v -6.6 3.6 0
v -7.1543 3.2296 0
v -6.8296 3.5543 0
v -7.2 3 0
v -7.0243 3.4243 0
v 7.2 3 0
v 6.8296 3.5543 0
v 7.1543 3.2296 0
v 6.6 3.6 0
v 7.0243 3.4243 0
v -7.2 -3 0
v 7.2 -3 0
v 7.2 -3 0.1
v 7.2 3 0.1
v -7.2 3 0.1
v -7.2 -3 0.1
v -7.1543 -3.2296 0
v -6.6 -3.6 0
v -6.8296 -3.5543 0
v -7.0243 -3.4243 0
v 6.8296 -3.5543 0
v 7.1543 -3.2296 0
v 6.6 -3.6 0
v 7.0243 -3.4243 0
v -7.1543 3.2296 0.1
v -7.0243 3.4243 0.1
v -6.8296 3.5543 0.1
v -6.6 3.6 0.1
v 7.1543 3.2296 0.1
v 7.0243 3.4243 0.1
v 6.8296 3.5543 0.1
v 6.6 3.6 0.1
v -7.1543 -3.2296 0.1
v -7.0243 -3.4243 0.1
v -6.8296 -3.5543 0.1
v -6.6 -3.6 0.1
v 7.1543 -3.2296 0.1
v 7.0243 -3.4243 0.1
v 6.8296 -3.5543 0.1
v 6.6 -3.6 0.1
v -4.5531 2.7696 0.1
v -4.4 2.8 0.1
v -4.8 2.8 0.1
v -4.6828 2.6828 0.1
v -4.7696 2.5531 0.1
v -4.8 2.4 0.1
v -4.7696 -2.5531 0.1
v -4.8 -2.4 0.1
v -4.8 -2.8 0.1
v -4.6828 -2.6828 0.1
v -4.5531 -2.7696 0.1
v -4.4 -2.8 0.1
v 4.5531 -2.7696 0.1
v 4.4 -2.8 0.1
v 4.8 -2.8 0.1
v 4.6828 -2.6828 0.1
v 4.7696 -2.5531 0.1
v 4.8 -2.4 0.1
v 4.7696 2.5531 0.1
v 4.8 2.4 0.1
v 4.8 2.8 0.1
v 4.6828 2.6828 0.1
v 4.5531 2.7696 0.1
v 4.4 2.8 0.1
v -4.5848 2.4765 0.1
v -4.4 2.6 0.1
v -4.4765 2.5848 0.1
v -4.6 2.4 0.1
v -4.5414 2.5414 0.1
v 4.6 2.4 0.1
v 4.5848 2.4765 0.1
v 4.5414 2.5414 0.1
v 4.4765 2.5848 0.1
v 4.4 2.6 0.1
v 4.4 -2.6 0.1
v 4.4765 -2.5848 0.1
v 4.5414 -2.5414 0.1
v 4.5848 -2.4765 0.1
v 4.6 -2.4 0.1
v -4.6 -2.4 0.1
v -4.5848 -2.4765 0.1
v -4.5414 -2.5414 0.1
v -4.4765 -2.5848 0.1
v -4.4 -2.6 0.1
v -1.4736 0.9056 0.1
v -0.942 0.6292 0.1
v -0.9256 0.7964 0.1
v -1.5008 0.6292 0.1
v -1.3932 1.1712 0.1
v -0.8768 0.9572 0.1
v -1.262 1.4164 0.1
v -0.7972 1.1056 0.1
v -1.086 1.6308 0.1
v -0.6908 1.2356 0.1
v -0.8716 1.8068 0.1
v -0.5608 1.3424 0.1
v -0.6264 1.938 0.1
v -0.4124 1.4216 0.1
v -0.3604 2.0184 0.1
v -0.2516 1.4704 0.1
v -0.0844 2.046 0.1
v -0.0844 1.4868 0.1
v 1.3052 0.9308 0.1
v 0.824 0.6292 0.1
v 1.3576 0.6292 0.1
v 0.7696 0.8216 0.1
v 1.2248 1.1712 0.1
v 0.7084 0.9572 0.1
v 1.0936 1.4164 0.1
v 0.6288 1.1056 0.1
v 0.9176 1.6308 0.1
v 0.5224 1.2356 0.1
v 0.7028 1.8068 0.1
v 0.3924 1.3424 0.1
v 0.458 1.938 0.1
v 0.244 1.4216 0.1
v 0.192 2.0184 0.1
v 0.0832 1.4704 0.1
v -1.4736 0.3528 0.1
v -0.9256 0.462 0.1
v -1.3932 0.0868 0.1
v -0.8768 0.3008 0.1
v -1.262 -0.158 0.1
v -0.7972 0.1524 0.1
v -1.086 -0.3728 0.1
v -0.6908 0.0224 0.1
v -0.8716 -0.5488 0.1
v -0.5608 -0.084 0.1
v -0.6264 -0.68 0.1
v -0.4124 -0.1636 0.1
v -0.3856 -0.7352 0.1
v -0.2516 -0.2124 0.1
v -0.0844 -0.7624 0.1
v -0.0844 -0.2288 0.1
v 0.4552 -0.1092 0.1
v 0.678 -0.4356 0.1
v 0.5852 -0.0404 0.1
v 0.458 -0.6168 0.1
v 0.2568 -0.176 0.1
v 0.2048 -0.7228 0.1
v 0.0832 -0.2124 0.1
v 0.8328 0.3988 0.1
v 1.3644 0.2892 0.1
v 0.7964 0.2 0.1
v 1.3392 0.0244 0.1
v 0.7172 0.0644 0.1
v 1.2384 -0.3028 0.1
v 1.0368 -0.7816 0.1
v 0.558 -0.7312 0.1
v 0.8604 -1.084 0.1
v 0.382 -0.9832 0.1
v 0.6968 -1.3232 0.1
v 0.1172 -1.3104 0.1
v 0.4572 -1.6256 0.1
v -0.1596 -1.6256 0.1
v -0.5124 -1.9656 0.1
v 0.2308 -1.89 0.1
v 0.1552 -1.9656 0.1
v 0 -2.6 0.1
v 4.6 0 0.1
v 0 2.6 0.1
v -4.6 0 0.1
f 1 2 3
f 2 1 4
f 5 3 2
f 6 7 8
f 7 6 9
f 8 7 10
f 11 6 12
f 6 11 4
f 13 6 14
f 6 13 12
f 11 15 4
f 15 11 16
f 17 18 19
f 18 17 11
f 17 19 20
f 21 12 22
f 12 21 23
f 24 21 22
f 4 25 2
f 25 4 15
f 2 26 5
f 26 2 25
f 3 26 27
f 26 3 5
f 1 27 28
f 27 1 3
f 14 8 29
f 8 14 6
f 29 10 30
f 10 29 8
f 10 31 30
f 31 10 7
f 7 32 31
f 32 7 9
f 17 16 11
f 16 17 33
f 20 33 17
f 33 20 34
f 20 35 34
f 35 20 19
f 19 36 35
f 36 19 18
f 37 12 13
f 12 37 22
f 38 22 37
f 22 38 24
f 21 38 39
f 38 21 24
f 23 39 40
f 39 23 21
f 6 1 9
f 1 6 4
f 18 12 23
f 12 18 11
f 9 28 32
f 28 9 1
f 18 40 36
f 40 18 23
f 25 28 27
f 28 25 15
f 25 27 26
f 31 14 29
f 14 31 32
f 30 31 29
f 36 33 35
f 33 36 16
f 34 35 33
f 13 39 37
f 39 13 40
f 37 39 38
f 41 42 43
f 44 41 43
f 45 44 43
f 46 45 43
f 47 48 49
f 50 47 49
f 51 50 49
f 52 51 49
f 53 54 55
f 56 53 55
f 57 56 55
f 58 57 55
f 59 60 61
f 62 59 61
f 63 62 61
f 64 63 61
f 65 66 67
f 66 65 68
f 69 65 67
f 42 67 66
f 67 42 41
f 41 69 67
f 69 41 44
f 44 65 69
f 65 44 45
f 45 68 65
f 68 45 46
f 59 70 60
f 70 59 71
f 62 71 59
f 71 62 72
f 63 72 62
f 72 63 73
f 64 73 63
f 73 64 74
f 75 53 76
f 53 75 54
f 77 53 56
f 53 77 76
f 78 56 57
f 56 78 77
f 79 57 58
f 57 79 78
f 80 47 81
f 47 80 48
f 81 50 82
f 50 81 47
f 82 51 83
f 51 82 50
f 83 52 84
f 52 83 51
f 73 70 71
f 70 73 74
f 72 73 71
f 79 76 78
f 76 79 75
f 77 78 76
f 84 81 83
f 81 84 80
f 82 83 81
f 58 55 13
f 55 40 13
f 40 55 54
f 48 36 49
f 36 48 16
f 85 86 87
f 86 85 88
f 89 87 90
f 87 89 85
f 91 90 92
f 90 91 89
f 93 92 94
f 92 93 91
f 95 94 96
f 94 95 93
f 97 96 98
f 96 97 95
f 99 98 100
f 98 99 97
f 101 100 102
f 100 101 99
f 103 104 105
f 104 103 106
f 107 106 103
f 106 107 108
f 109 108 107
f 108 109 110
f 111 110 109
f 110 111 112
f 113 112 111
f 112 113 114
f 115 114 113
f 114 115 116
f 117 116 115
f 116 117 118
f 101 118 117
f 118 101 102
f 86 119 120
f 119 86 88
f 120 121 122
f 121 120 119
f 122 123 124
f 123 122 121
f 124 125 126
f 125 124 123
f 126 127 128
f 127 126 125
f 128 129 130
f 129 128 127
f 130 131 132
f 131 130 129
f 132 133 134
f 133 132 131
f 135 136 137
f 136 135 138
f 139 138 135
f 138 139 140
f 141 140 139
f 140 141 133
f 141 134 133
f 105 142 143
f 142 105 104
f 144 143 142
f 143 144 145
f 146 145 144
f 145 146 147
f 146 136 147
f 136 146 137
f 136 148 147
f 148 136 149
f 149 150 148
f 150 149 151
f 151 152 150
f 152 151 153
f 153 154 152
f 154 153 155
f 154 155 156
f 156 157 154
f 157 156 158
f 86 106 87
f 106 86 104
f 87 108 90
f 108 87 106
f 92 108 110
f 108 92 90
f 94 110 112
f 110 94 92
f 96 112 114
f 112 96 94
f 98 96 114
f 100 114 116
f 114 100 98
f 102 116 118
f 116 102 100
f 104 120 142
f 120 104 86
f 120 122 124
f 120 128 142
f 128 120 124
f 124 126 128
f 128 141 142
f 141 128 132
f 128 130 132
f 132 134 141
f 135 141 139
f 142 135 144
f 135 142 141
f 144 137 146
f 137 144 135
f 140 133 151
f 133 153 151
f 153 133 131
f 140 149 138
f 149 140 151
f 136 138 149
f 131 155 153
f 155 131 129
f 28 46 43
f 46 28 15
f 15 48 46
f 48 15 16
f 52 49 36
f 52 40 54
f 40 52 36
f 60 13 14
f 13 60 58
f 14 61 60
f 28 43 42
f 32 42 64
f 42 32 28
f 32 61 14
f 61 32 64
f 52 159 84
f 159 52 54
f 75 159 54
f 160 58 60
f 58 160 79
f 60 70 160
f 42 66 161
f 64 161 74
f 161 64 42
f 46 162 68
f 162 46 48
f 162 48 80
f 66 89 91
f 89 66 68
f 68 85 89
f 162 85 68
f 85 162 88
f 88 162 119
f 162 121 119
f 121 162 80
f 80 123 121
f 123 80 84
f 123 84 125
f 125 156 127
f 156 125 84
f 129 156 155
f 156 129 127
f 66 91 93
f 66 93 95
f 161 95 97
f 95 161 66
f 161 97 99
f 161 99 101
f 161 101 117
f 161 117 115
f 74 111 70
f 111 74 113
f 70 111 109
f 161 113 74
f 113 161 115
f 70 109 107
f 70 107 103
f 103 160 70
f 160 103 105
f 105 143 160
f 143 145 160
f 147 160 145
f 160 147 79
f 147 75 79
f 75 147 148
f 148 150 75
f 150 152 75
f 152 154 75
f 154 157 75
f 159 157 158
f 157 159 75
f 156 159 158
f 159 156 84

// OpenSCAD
// file: ../p/box3u12.scad
use <../lib.scad>
function ldraw_lib__box3u12() = [
// 0 Box with 3 Parallel Faces without Any Edges
// 0 Name: box3u12.dat
// 0 Author: J.C. Tchang [tchang]
// 0 !LDRAW_ORG Primitive UPDATE 2014-02
// 0 !LICENSE Licensed under CC BY 4.0 : see CAreadme.txt
// 
// 0 BFC CERTIFY CCW
  [0,"BFC","CERTIFY"],
  [0,"BFC","CCW"],
// 
// 0 !HISTORY 2014-12-23 [PTadmin] Official Update 2014-02
// 
// 
// 4 16 -1 1 1 1 1 1 1 1 -1 -1 1 -1
  [4,16,-1,1,1,1,1,1,1,1,-1,-1,1,-1],
// 4 16 -1 1 1 -1 0 1 1 0 1 1 1 1
  [4,16,-1,1,1,-1,0,1,1,0,1,1,1,1],
// 4 16 1 1 -1 1 0 -1 -1 0 -1 -1 1 -1
  [4,16,1,1,-1,1,0,-1,-1,0,-1,-1,1,-1],
];
module ldraw_lib__box3u12(step=0, col=false, unit=2/5, alt=false, line=0.2, solid=!$preview)
    makepoly(ldraw_lib__box3u12(), step=step, col=col, unit=unit, alt=alt, line=line, solid=solid);
ldraw_lib__box3u12(line=0.2);
// file: ../p/1-4cyli.scad
use <../lib.scad>
function ldraw_lib__1_4cyli() = [
// 0 Cylinder 0.25
// 0 Name: 1-4cyli.dat
// 0 Author: James Jessiman
// 0 !LDRAW_ORG Primitive UPDATE 2012-01
// 0 !LICENSE Licensed under CC BY 4.0 : see CAreadme.txt
// 
// 0 BFC CERTIFY CCW
  [0,"BFC","CERTIFY"],
  [0,"BFC","CCW"],
// 
// 0 !HISTORY 2002-03-23 [sbliss] Added BFC statement.
// 0 !HISTORY 2002-04-25 [PTadmin] Official Update 2002-02
// 0 !HISTORY 2007-06-22 [PTadmin] Header formatted for Contributor Agreement
// 0 !HISTORY 2008-07-01 [PTadmin] Official Update 2008-01
// 0 !HISTORY 2012-02-16 [Philo] Changed to CCW
// 0 !HISTORY 2012-03-30 [PTadmin] Official Update 2012-01
// 
// 
// 4 16 1 1 0 0.9239 1 0.3827 0.9239 0 0.3827 1 0 0
  [4,16,1,1,0,0.9239,1,0.3827,0.9239,0,0.3827,1,0,0],
// 5 24 1 0 0 1 1 0 0.9239 0 0.3827 1 0 -1
  [5,24,1,0,0,1,1,0,0.9239,0,0.3827,1,0,-1],
// 4 16 0.9239 1 0.3827 0.7071 1 0.7071 0.7071 0 0.7071 0.9239 0 0.3827
  [4,16,0.9239,1,0.3827,0.7071,1,0.7071,0.7071,0,0.7071,0.9239,0,0.3827],
// 5 24 0.9239 0 0.3827 0.9239 1 0.3827 0.7071 0 0.7071 1 0 0
  [5,24,0.9239,0,0.3827,0.9239,1,0.3827,0.7071,0,0.7071,1,0,0],
// 4 16 0.7071 1 0.7071 0.3827 1 0.9239 0.3827 0 0.9239 0.7071 0 0.7071
  [4,16,0.7071,1,0.7071,0.3827,1,0.9239,0.3827,0,0.9239,0.7071,0,0.7071],
// 5 24 0.7071 0 0.7071 0.7071 1 0.7071 0.3827 0 0.9239 0.9239 0 0.3827
  [5,24,0.7071,0,0.7071,0.7071,1,0.7071,0.3827,0,0.9239,0.9239,0,0.3827],
// 4 16 0.3827 1 0.9239 0 1 1 0 0 1 0.3827 0 0.9239
  [4,16,0.3827,1,0.9239,0,1,1,0,0,1,0.3827,0,0.9239],
// 5 24 0.3827 0 0.9239 0.3827 1 0.9239 0 0 1 0.7071 0 0.7071
  [5,24,0.3827,0,0.9239,0.3827,1,0.9239,0,0,1,0.7071,0,0.7071],
// 5 24 0 0 1 0 1 1 0.3827 0 0.9239 -1 0 1
  [5,24,0,0,1,0,1,1,0.3827,0,0.9239,-1,0,1],
];
module ldraw_lib__1_4cyli(step=0, col=false, unit=2/5, alt=false, line=0.2, solid=!$preview)
    makepoly(ldraw_lib__1_4cyli(), step=step, col=col, unit=unit, alt=alt, line=line, solid=solid);
ldraw_lib__1_4cyli(line=0.2);
// file: s/stickerback009x018.scad
use <../../lib.scad>
use <../../p/1-4chrd.scad>
use <../../p/1-4cyli.scad>
use <../../p/box3u12.scad>
function ldraw_lib__s__stickerback009x018() = [
// 0 ~Sticker Back  0.9 x  1.8
// 0 Name: s\stickerback009x018.dat
// 0 Author: Massimo Maso [Sirio]
// 0 !LDRAW_ORG Subpart UPDATE 2026-05
// 0 !LICENSE Licensed under CC BY 4.0 : see CAreadme.txt
// 
// 0 BFC CERTIFY CCW
  [0,"BFC","CERTIFY"],
  [0,"BFC","CCW"],
// 
// 0 !HISTORY 2026-05-31 [OrionP] Official Update 2026-05
// 
// 0 // Primitives
// 1 16 -16.5 0 7.5 -1.5 0 0 0 -1 0 0 0 1.5 1-4chrd.dat
  [1,16,-16.5,0,7.5,-1.5,0,0,0,-1,0,0,0,1.5, ldraw_lib__1_4chrd()],
// 1 16 16.5 0 7.5 1.5 0 0 0 -1 0 0 0 1.5 1-4chrd.dat
  [1,16,16.5,0,7.5,1.5,0,0,0,-1,0,0,0,1.5, ldraw_lib__1_4chrd()],
// 1 16 0 -.25 0 0 0 18 0 .25 0 7.5 0 0 box3u12.dat
  [1,16,0,-.25,0,0,0,18,0,.25,0,7.5,0,0, ldraw_lib__box3u12()],
// 1 16 -16.5 0 -7.5 -1.5 0 0 0 -1 0 0 0 -1.5 1-4chrd.dat
  [1,16,-16.5,0,-7.5,-1.5,0,0,0,-1,0,0,0,-1.5, ldraw_lib__1_4chrd()],
// 1 16 16.5 0 -7.5 1.5 0 0 0 -1 0 0 0 -1.5 1-4chrd.dat
  [1,16,16.5,0,-7.5,1.5,0,0,0,-1,0,0,0,-1.5, ldraw_lib__1_4chrd()],
// 1 16 -16.5 -.25 7.5 -1.5 0 0 0 .25 0 0 0 1.5 1-4cyli.dat
  [1,16,-16.5,-.25,7.5,-1.5,0,0,0,.25,0,0,0,1.5, ldraw_lib__1_4cyli()],
// 1 16 16.5 -.25 7.5 1.5 0 0 0 .25 0 0 0 1.5 1-4cyli.dat
  [1,16,16.5,-.25,7.5,1.5,0,0,0,.25,0,0,0,1.5, ldraw_lib__1_4cyli()],
// 1 16 -16.5 -.25 -7.5 -1.5 0 0 0 .25 0 0 0 -1.5 1-4cyli.dat
  [1,16,-16.5,-.25,-7.5,-1.5,0,0,0,.25,0,0,0,-1.5, ldraw_lib__1_4cyli()],
// 1 16 16.5 -.25 -7.5 1.5 0 0 0 .25 0 0 0 -1.5 1-4cyli.dat
  [1,16,16.5,-.25,-7.5,1.5,0,0,0,.25,0,0,0,-1.5, ldraw_lib__1_4cyli()],
// 0 // Bottom face
// 4 16 -18 0 7.5 -16.5 0 9 16.5 0 9 18 0 7.5
  [4,16,-18,0,7.5,-16.5,0,9,16.5,0,9,18,0,7.5],
// 4 16 -18 0 -7.5 18 0 -7.5 16.5 0 -9 -16.5 0 -9
  [4,16,-18,0,-7.5,18,0,-7.5,16.5,0,-9,-16.5,0,-9],
// 0 // Lateral face
// 4 16 -16.5 0 9 -16.5 -.25 9 16.5 -.25 9 16.5 0 9
  [4,16,-16.5,0,9,-16.5,-.25,9,16.5,-.25,9,16.5,0,9],
// 4 16 16.5 0 -9 16.5 -.25 -9 -16.5 -.25 -9 -16.5 0 -9
  [4,16,16.5,0,-9,16.5,-.25,-9,-16.5,-.25,-9,-16.5,0,-9],
];
module ldraw_lib__s__stickerback009x018(step=0, col=false, unit=2/5, alt=false, line=0.2, solid=!$preview)
    makepoly(ldraw_lib__s__stickerback009x018(), step=step, col=col, unit=unit, alt=alt, line=line, solid=solid);
ldraw_lib__s__stickerback009x018(line=0.2);
// file: ../p/1-4ring1.scad
use <../lib.scad>
function ldraw_lib__1_4ring1() = [
// 0 Ring  1 x 0.25
// 0 Name: 1-4ring1.dat
// 0 Author: Chris Dee [cwdee]
// 0 !LDRAW_ORG Primitive UPDATE 2012-01
// 0 !LICENSE Licensed under CC BY 4.0 : see CAreadme.txt
// 
// 0 BFC CERTIFY CCW
  [0,"BFC","CERTIFY"],
  [0,"BFC","CCW"],
// 
// 0 !HISTORY 2000-05-07 [PTadmin] Official Update 2000-01
// 0 !HISTORY 2002-11-22 [hafhead] Added BFC statement
// 0 !HISTORY 2002-11-30 [PTadmin] Official Update 2002-05
// 0 !HISTORY 2007-06-22 [PTadmin] Header formatted for Contributor Agreement
// 0 !HISTORY 2008-07-01 [PTadmin] Official Update 2008-01
// 0 !HISTORY 2012-02-16 [Philo] Changed to CCW
// 0 !HISTORY 2012-03-30 [PTadmin] Official Update 2012-01
// 
// 
// 4 16 2 0 0 1.8478 0 0.7654 0.9239 0 0.3827 1 0 0
  [4,16,2,0,0,1.8478,0,0.7654,0.9239,0,0.3827,1,0,0],
// 4 16 1.8478 0 0.7654 1.4142 0 1.4142 0.7071 0 0.7071 0.9239 0 0.3827
  [4,16,1.8478,0,0.7654,1.4142,0,1.4142,0.7071,0,0.7071,0.9239,0,0.3827],
// 4 16 1.4142 0 1.4142 0.7654 0 1.8478 0.3827 0 0.9239 0.7071 0 0.7071
  [4,16,1.4142,0,1.4142,0.7654,0,1.8478,0.3827,0,0.9239,0.7071,0,0.7071],
// 4 16 0.7654 0 1.8478 0 0 2 0 0 1 0.3827 0 0.9239
  [4,16,0.7654,0,1.8478,0,0,2,0,0,1,0.3827,0,0.9239],
];
module ldraw_lib__1_4ring1(step=0, col=false, unit=2/5, alt=false, line=0.2, solid=!$preview)
    makepoly(ldraw_lib__1_4ring1(), step=step, col=col, unit=unit, alt=alt, line=line, solid=solid);
ldraw_lib__1_4ring1(line=0.2);
// file: ../p/1-4ndis.scad
use <../lib.scad>
function ldraw_lib__1_4ndis() = [
// 0 Disc Negative 0.25
// 0 Name: 1-4ndis.dat
// 0 Author: James Jessiman
// 0 !LDRAW_ORG Primitive UPDATE 2012-01
// 0 !LICENSE Licensed under CC BY 4.0 : see CAreadme.txt
// 
// 0 BFC CERTIFY CCW
  [0,"BFC","CERTIFY"],
  [0,"BFC","CCW"],
// 
// 0 !HISTORY 2002-03-23 [sbliss] Added BFC Statement
// 0 !HISTORY 2002-04-25 [PTadmin] Official Update 2002-02
// 0 !HISTORY 2007-06-22 [PTadmin] Header formatted for Contributor Agreement
// 0 !HISTORY 2008-07-01 [PTadmin] Official Update 2008-01
// 0 !HISTORY 2012-02-16 [Philo] Changed to CCW
// 0 !HISTORY 2012-03-30 [PTadmin] Official Update 2012-01
// 
// 
// 3 16 0.9239 0 0.3827 1 0 0 1 0 1
  [3,16,0.9239,0,0.3827,1,0,0,1,0,1],
// 3 16 0.7071 0 0.7071 0.9239 0 0.3827 1 0 1
  [3,16,0.7071,0,0.7071,0.9239,0,0.3827,1,0,1],
// 3 16 0.3827 0 0.9239 0.7071 0 0.7071 1 0 1
  [3,16,0.3827,0,0.9239,0.7071,0,0.7071,1,0,1],
// 3 16 0 0 1 0.3827 0 0.9239 1 0 1
  [3,16,0,0,1,0.3827,0,0.9239,1,0,1],
];
module ldraw_lib__1_4ndis(step=0, col=false, unit=2/5, alt=false, line=0.2, solid=!$preview)
    makepoly(ldraw_lib__1_4ndis(), step=step, col=col, unit=unit, alt=alt, line=line, solid=solid);
ldraw_lib__1_4ndis(line=0.2);
// file: ../p/1-4chrd.scad
use <../lib.scad>
function ldraw_lib__1_4chrd() = [
// 0 Chord 0.25
// 0 Name: 1-4chrd.dat
// 0 Author: Max Martin Richter [MMR1988]
// 0 !LDRAW_ORG Primitive UPDATE 2023-05
// 0 !LICENSE Licensed under CC BY 4.0 : see CAreadme.txt
// 
// 0 BFC CERTIFY CCW
  [0,"BFC","CERTIFY"],
  [0,"BFC","CCW"],
// 
// 0 !HISTORY 2004-04-22 [PTadmin] Official Update 2004-02
// 0 !HISTORY 2007-10-09 [PTadmin] Header formatted for Contributor Agreement
// 0 !HISTORY 2008-07-01 [PTadmin] Official Update 2008-01
// 0 !HISTORY 2012-08-02 [MMR1988] Re-creation with PrimGen2 and Rectifier
// 0 !HISTORY 2012-08-09 [PTadmin] Official Update 2012-02
// 0 !HISTORY 2023-10-27 [OrionP] Change author to MMR1988 from hafhead
// 0 !HISTORY 2023-10-31 [OrionP] Official Update 2023-05
// 
// 4 16 0.9239 0 0.3827 0.3827 0 0.9239 0 0 1 1 0 0
  [4,16,0.9239,0,0.3827,0.3827,0,0.9239,0,0,1,1,0,0],
// 3 16 0.7071 0 0.7071 0.3827 0 0.9239 0.9239 0 0.3827
  [3,16,0.7071,0,0.7071,0.3827,0,0.9239,0.9239,0,0.3827],
];
module ldraw_lib__1_4chrd(step=0, col=false, unit=2/5, alt=false, line=0.2, solid=!$preview)
    makepoly(ldraw_lib__1_4chrd(), step=step, col=col, unit=unit, alt=alt, line=line, solid=solid);
ldraw_lib__1_4chrd(line=0.2);
// main file
use <../lib.scad>
use <../p/1-4chrd.scad>
use <../p/1-4ndis.scad>
use <../p/1-4ring1.scad>
use <s/stickerback009x018.scad>
function ldraw_lib__6196575s() = [
// 0 Sticker  0.9 x  1.8 with White "9" on Black Background and Red Border
// 0 Name: 6196575s.dat
// 0 Author: Evert-Jan Boer [ejboer]
// 0 !LDRAW_ORG Part UPDATE 2026-09
// 0 !LICENSE Licensed under CC BY 4.0 : see CAreadme.txt
// 
// 0 BFC CERTIFY CCW
  [0,"BFC","CERTIFY"],
  [0,"BFC","CCW"],
// 
// 0 !CATEGORY Sticker
// 0 !KEYWORDS Bricklink 10258stk01, Brickowl 992817, London Bus, Rebrickable 34561
// 0 !KEYWORDS set 10258
// 
// 0 !HISTORY 2024-09-30 [OrionP] Official Update 2024-08
// 0 !HISTORY 2026-04-17 [Sirio] Introduced stickerback, changed description and adapted top face
// 0 !HISTORY 2026-09-30 [OrionP] Official Update 2026-09
// 
// 0 // Stickerback
// 1 16 0 0 0 1 0 0 0 1 0 0 0 1 s\stickerback009x018.dat
  [1,16,0,0,0,1,0,0,0,1,0,0,0,1, ldraw_lib__s__stickerback009x018()],
// 0 // Primitives
// 1 4 -16.5 -.25 7.5 -1.5 0 0 0 1 0 0 0 1.5 1-4chrd.dat
  [1,4,-16.5,-.25,7.5,-1.5,0,0,0,1,0,0,0,1.5, ldraw_lib__1_4chrd()],
// 1 4 16.5 -.25 7.5 1.5 0 0 0 1 0 0 0 1.5 1-4chrd.dat
  [1,4,16.5,-.25,7.5,1.5,0,0,0,1,0,0,0,1.5, ldraw_lib__1_4chrd()],
// 1 4 -16.5 -.25 -7.5 -1.5 0 0 0 1 0 0 0 -1.5 1-4chrd.dat
  [1,4,-16.5,-.25,-7.5,-1.5,0,0,0,1,0,0,0,-1.5, ldraw_lib__1_4chrd()],
// 1 4 16.5 -.25 -7.5 1.5 0 0 0 1 0 0 0 -1.5 1-4chrd.dat
  [1,4,16.5,-.25,-7.5,1.5,0,0,0,1,0,0,0,-1.5, ldraw_lib__1_4chrd()],
// 1 4 -11 -.25 6 0 0 -1 0 1 0 1 0 0 1-4ndis.dat
  [1,4,-11,-.25,6,0,0,-1,0,1,0,1,0,0, ldraw_lib__1_4ndis()],
// 1 4 -11 -.25 -6 -1 0 0 0 1 0 0 0 -1 1-4ndis.dat
  [1,4,-11,-.25,-6,-1,0,0,0,1,0,0,0,-1, ldraw_lib__1_4ndis()],
// 1 4 11 -.25 -6 0 0 1 0 1 0 -1 0 0 1-4ndis.dat
  [1,4,11,-.25,-6,0,0,1,0,1,0,-1,0,0, ldraw_lib__1_4ndis()],
// 1 4 11 -.25 6 1 0 0 0 1 0 0 0 1 1-4ndis.dat
  [1,4,11,-.25,6,1,0,0,0,1,0,0,0,1, ldraw_lib__1_4ndis()],
// 1 0 -11 -.25 6 0 0 -.5 0 1 0 .5 0 0 1-4chrd.dat
  [1,0,-11,-.25,6,0,0,-.5,0,1,0,.5,0,0, ldraw_lib__1_4chrd()],
// 1 15 -11 -.25 6 0 0 -.5 0 1 0 .5 0 0 1-4ring1.dat
  [1,15,-11,-.25,6,0,0,-.5,0,1,0,.5,0,0, ldraw_lib__1_4ring1()],
// 1 15 11 -.25 6 .5 0 0 0 1 0 0 0 .5 1-4ring1.dat
  [1,15,11,-.25,6,.5,0,0,0,1,0,0,0,.5, ldraw_lib__1_4ring1()],
// 1 15 11 -.25 -6 0 0 .5 0 1 0 -.5 0 0 1-4ring1.dat
  [1,15,11,-.25,-6,0,0,.5,0,1,0,-.5,0,0, ldraw_lib__1_4ring1()],
// 1 15 -11 -.25 -6 -.5 0 0 0 1 0 0 0 -.5 1-4ring1.dat
  [1,15,-11,-.25,-6,-.5,0,0,0,1,0,0,0,-.5, ldraw_lib__1_4ring1()],
// 1 0 11 -.25 6 .5 0 0 0 1 0 0 0 .5 1-4chrd.dat
  [1,0,11,-.25,6,.5,0,0,0,1,0,0,0,.5, ldraw_lib__1_4chrd()],
// 1 0 11 -.25 -6 0 0 .5 0 1 0 -.5 0 0 1-4chrd.dat
  [1,0,11,-.25,-6,0,0,.5,0,1,0,-.5,0,0, ldraw_lib__1_4chrd()],
// 1 0 -11 -.25 -6 -.5 0 0 0 1 0 0 0 -.5 1-4chrd.dat
  [1,0,-11,-.25,-6,-.5,0,0,0,1,0,0,0,-.5, ldraw_lib__1_4chrd()],
// 0 // Top face
// 3 4 12 -.25 -6 12 -.25 -7 18 -.25 -7.5
  [3,4,12,-.25,-6,12,-.25,-7,18,-.25,-7.5],
// 4 4 11 -.25 -7 16.5 -.25 -9 18 -.25 -7.5 12 -.25 -7
  [4,4,11,-.25,-7,16.5,-.25,-9,18,-.25,-7.5,12,-.25,-7],
// 4 4 -16.5 -.25 -9 -12 -.25 -7 -12 -.25 -6 -18 -.25 -7.5
  [4,4,-16.5,-.25,-9,-12,-.25,-7,-12,-.25,-6,-18,-.25,-7.5],
// 4 15 -3.684 -.25 2.264 -3.752 -.25 1.573 -2.355 -.25 1.573 -2.314 -.25 1.991
  [4,15,-3.684,-.25,2.264,-3.752,-.25,1.573,-2.355,-.25,1.573,-2.314,-.25,1.991],
// 4 15 -3.483 -.25 2.928 -3.684 -.25 2.264 -2.314 -.25 1.991 -2.192 -.25 2.393
  [4,15,-3.483,-.25,2.928,-3.684,-.25,2.264,-2.314,-.25,1.991,-2.192,-.25,2.393],
// 4 15 -2.192 -.25 2.393 -1.993 -.25 2.764 -3.155 -.25 3.541 -3.483 -.25 2.928
  [4,15,-2.192,-.25,2.393,-1.993,-.25,2.764,-3.155,-.25,3.541,-3.483,-.25,2.928],
// 4 15 -1.993 -.25 2.764 -1.727 -.25 3.089 -2.715 -.25 4.077 -3.155 -.25 3.541
  [4,15,-1.993,-.25,2.764,-1.727,-.25,3.089,-2.715,-.25,4.077,-3.155,-.25,3.541],
// 4 15 -2.179 -.25 4.517 -2.715 -.25 4.077 -1.727 -.25 3.089 -1.402 -.25 3.356
  [4,15,-2.179,-.25,4.517,-2.715,-.25,4.077,-1.727,-.25,3.089,-1.402,-.25,3.356],
// 4 15 -1.402 -.25 3.356 -1.031 -.25 3.554 -1.566 -.25 4.845 -2.179 -.25 4.517
  [4,15,-1.402,-.25,3.356,-1.031,-.25,3.554,-1.566,-.25,4.845,-2.179,-.25,4.517],
// 4 15 -.901 -.25 5.046 -1.566 -.25 4.845 -1.031 -.25 3.554 -.629 -.25 3.676
  [4,15,-.901,-.25,5.046,-1.566,-.25,4.845,-1.031,-.25,3.554,-.629,-.25,3.676],
// 4 15 -.211 -.25 5.115 -.901 -.25 5.046 -.629 -.25 3.676 -.211 -.25 3.717
  [4,15,-.211,-.25,5.115,-.901,-.25,5.046,-.629,-.25,3.676,-.211,-.25,3.717],
// 4 15 3.263 -.25 2.327 1.924 -.25 2.054 2.06 -.25 1.573 3.394 -.25 1.573
  [4,15,3.263,-.25,2.327,1.924,-.25,2.054,2.06,-.25,1.573,3.394,-.25,1.573],
// 4 15 1.924 -.25 2.054 3.263 -.25 2.327 3.062 -.25 2.928 1.771 -.25 2.393
  [4,15,1.924,-.25,2.054,3.263,-.25,2.327,3.062,-.25,2.928,1.771,-.25,2.393],
// 4 15 2.734 -.25 3.541 1.572 -.25 2.764 1.771 -.25 2.393 3.062 -.25 2.928
  [4,15,2.734,-.25,3.541,1.572,-.25,2.764,1.771,-.25,2.393,3.062,-.25,2.928],
// 4 15 1.572 -.25 2.764 2.734 -.25 3.541 2.294 -.25 4.077 1.306 -.25 3.089
  [4,15,1.572,-.25,2.764,2.734,-.25,3.541,2.294,-.25,4.077,1.306,-.25,3.089],
// 4 15 1.306 -.25 3.089 2.294 -.25 4.077 1.757 -.25 4.517 .981 -.25 3.356
  [4,15,1.306,-.25,3.089,2.294,-.25,4.077,1.757,-.25,4.517,.981,-.25,3.356],
// 4 15 .981 -.25 3.356 1.757 -.25 4.517 1.145 -.25 4.845 .61 -.25 3.554
  [4,15,.981,-.25,3.356,1.757,-.25,4.517,1.145,-.25,4.845,.61,-.25,3.554],
// 4 15 .61 -.25 3.554 1.145 -.25 4.845 .48 -.25 5.046 .208 -.25 3.676
  [4,15,.61,-.25,3.554,1.145,-.25,4.845,.48,-.25,5.046,.208,-.25,3.676],
// 4 15 .208 -.25 3.676 .48 -.25 5.046 -.211 -.25 5.115 -.211 -.25 3.717
  [4,15,.208,-.25,3.676,.48,-.25,5.046,-.211,-.25,5.115,-.211,-.25,3.717],
// 4 15 -3.684 -.25 .882 -2.314 -.25 1.155 -2.355 -.25 1.573 -3.752 -.25 1.573
  [4,15,-3.684,-.25,.882,-2.314,-.25,1.155,-2.355,-.25,1.573,-3.752,-.25,1.573],
// 4 15 -3.483 -.25 .217 -2.192 -.25 .752 -2.314 -.25 1.155 -3.684 -.25 .882
  [4,15,-3.483,-.25,.217,-2.192,-.25,.752,-2.314,-.25,1.155,-3.684,-.25,.882],
// 4 15 -2.192 -.25 .752 -3.483 -.25 .217 -3.155 -.25 -.395 -1.993 -.25 .381
  [4,15,-2.192,-.25,.752,-3.483,-.25,.217,-3.155,-.25,-.395,-1.993,-.25,.381],
// 4 15 -1.993 -.25 .381 -3.155 -.25 -.395 -2.715 -.25 -.932 -1.727 -.25 .056
  [4,15,-1.993,-.25,.381,-3.155,-.25,-.395,-2.715,-.25,-.932,-1.727,-.25,.056],
// 4 15 -2.179 -.25 -1.372 -1.402 -.25 -.21 -1.727 -.25 .056 -2.715 -.25 -.932
  [4,15,-2.179,-.25,-1.372,-1.402,-.25,-.21,-1.727,-.25,.056,-2.715,-.25,-.932],
// 4 15 -1.566 -.25 -1.7 -1.031 -.25 -.409 -1.402 -.25 -.21 -2.179 -.25 -1.372
  [4,15,-1.566,-.25,-1.7,-1.031,-.25,-.409,-1.402,-.25,-.21,-2.179,-.25,-1.372],
// 4 15 -1.031 -.25 -.409 -1.566 -.25 -1.7 -.964 -.25 -1.838 -.629 -.25 -.531
  [4,15,-1.031,-.25,-.409,-1.566,-.25,-1.7,-.964,-.25,-1.838,-.629,-.25,-.531],
// 4 15 -.211 -.25 -1.906 -.211 -.25 -.572 -.629 -.25 -.531 -.964 -.25 -1.838
  [4,15,-.211,-.25,-1.906,-.211,-.25,-.572,-.629,-.25,-.531,-.964,-.25,-1.838],
// 4 15 1.138 -.25 -.273 1.145 -.25 -1.542 1.695 -.25 -1.089 1.463 -.25 -.101
  [4,15,1.138,-.25,-.273,1.145,-.25,-1.542,1.695,-.25,-1.089,1.463,-.25,-.101],
// 4 15 1.145 -.25 -1.542 1.138 -.25 -.273 .642 -.25 -.44 .512 -.25 -1.807
  [4,15,1.145,-.25,-1.542,1.138,-.25,-.273,.642,-.25,-.44,.512,-.25,-1.807],
// 4 15 .208 -.25 -.531 -.211 -.25 -1.906 .512 -.25 -1.807 .642 -.25 -.44
  [4,15,.208,-.25,-.531,-.211,-.25,-1.906,.512,-.25,-1.807,.642,-.25,-.44],
// 3 15 .208 -.25 -.531 -.211 -.25 -.572 -.211 -.25 -1.906
  [3,15,.208,-.25,-.531,-.211,-.25,-.572,-.211,-.25,-1.906],
// 4 15 2.082 -.25 .997 3.411 -.25 .723 3.394 -.25 1.573 2.06 -.25 1.573
  [4,15,2.082,-.25,.997,3.411,-.25,.723,3.394,-.25,1.573,2.06,-.25,1.573],
// 4 15 1.991 -.25 .5 3.348 -.25 .061 3.411 -.25 .723 2.082 -.25 .997
  [4,15,1.991,-.25,.5,3.348,-.25,.061,3.411,-.25,.723,2.082,-.25,.997],
// 4 15 1.793 -.25 .161 3.096 -.25 -.757 3.348 -.25 .061 1.991 -.25 .5
  [4,15,1.793,-.25,.161,3.096,-.25,-.757,3.348,-.25,.061,1.991,-.25,.5],
// 4 15 1.463 -.25 -.101 1.695 -.25 -1.089 3.096 -.25 -.757 1.793 -.25 .161
  [4,15,1.463,-.25,-.101,1.695,-.25,-1.089,3.096,-.25,-.757,1.793,-.25,.161],
// 4 15 2.592 -.25 -1.954 3.096 -.25 -.757 1.695 -.25 -1.089 1.395 -.25 -1.828
  [4,15,2.592,-.25,-1.954,3.096,-.25,-.757,1.695,-.25,-1.089,1.395,-.25,-1.828],
// 4 15 2.151 -.25 -2.71 2.592 -.25 -1.954 1.395 -.25 -1.828 .955 -.25 -2.458
  [4,15,2.151,-.25,-2.71,2.592,-.25,-1.954,1.395,-.25,-1.828,.955,-.25,-2.458],
// 4 15 .955 -.25 -2.458 .293 -.25 -3.276 1.742 -.25 -3.308 2.151 -.25 -2.71
  [4,15,.955,-.25,-2.458,.293,-.25,-3.276,1.742,-.25,-3.308,2.151,-.25,-2.71],
// 4 15 .293 -.25 -3.276 -.399 -.25 -4.064 1.143 -.25 -4.064 1.742 -.25 -3.308
  [4,15,.293,-.25,-3.276,-.399,-.25,-4.064,1.143,-.25,-4.064,1.742,-.25,-3.308],
// 3 15 1.143 -.25 -4.064 -.399 -.25 -4.064 -1.281 -.25 -4.914
  [3,15,1.143,-.25,-4.064,-.399,-.25,-4.064,-1.281,-.25,-4.914],
// 4 15 .388 -.25 -4.914 .577 -.25 -4.725 1.143 -.25 -4.064 -1.281 -.25 -4.914
  [4,15,.388,-.25,-4.914,.577,-.25,-4.725,1.143,-.25,-4.064,-1.281,-.25,-4.914],
// 4 0 -2.314 -.25 1.991 -2.355 -.25 1.573 2.06 -.25 1.573 1.924 -.25 2.054
  [4,0,-2.314,-.25,1.991,-2.355,-.25,1.573,2.06,-.25,1.573,1.924,-.25,2.054],
// 4 0 -2.314 -.25 1.991 1.924 -.25 2.054 1.771 -.25 2.393 -2.192 -.25 2.393
  [4,0,-2.314,-.25,1.991,1.924,-.25,2.054,1.771,-.25,2.393,-2.192,-.25,2.393],
// 4 0 1.771 -.25 2.393 1.572 -.25 2.764 -1.993 -.25 2.764 -2.192 -.25 2.393
  [4,0,1.771,-.25,2.393,1.572,-.25,2.764,-1.993,-.25,2.764,-2.192,-.25,2.393],
// 4 0 -1.993 -.25 2.764 1.572 -.25 2.764 1.306 -.25 3.089 -1.727 -.25 3.089
  [4,0,-1.993,-.25,2.764,1.572,-.25,2.764,1.306,-.25,3.089,-1.727,-.25,3.089],
// 4 0 -1.402 -.25 3.356 -1.727 -.25 3.089 1.306 -.25 3.089 .981 -.25 3.356
  [4,0,-1.402,-.25,3.356,-1.727,-.25,3.089,1.306,-.25,3.089,.981,-.25,3.356],
// 3 0 -1.031 -.25 3.554 -1.402 -.25 3.356 .981 -.25 3.356
  [3,0,-1.031,-.25,3.554,-1.402,-.25,3.356,.981,-.25,3.356],
// 4 0 .981 -.25 3.356 .61 -.25 3.554 -.629 -.25 3.676 -1.031 -.25 3.554
  [4,0,.981,-.25,3.356,.61,-.25,3.554,-.629,-.25,3.676,-1.031,-.25,3.554],
// 4 0 .61 -.25 3.554 .208 -.25 3.676 -.211 -.25 3.717 -.629 -.25 3.676
  [4,0,.61,-.25,3.554,.208,-.25,3.676,-.211,-.25,3.717,-.629,-.25,3.676],
// 4 0 -2.355 -.25 1.573 -2.314 -.25 1.155 2.082 -.25 .997 2.06 -.25 1.573
  [4,0,-2.355,-.25,1.573,-2.314,-.25,1.155,2.082,-.25,.997,2.06,-.25,1.573],
// 3 0 -2.314 -.25 1.155 -2.192 -.25 .752 -1.993 -.25 .381
  [3,0,-2.314,-.25,1.155,-2.192,-.25,.752,-1.993,-.25,.381],
// 4 0 -1.402 -.25 -.21 2.082 -.25 .997 -2.314 -.25 1.155 -1.993 -.25 .381
  [4,0,-1.402,-.25,-.21,2.082,-.25,.997,-2.314,-.25,1.155,-1.993,-.25,.381],
// 3 0 -1.993 -.25 .381 -1.727 -.25 .056 -1.402 -.25 -.21
  [3,0,-1.993,-.25,.381,-1.727,-.25,.056,-1.402,-.25,-.21],
// 4 0 .208 -.25 -.531 2.082 -.25 .997 -1.402 -.25 -.21 -.629 -.25 -.531
  [4,0,.208,-.25,-.531,2.082,-.25,.997,-1.402,-.25,-.21,-.629,-.25,-.531],
// 3 0 -1.402 -.25 -.21 -1.031 -.25 -.409 -.629 -.25 -.531
  [3,0,-1.402,-.25,-.21,-1.031,-.25,-.409,-.629,-.25,-.531],
// 3 0 -.629 -.25 -.531 -.211 -.25 -.572 .208 -.25 -.531
  [3,0,-.629,-.25,-.531,-.211,-.25,-.572,.208,-.25,-.531],
// 3 0 1.138 -.25 -.273 .208 -.25 -.531 .642 -.25 -.44
  [3,0,1.138,-.25,-.273,.208,-.25,-.531,.642,-.25,-.44],
// 4 0 .208 -.25 -.531 1.138 -.25 -.273 1.991 -.25 .5 2.082 -.25 .997
  [4,0,.208,-.25,-.531,1.138,-.25,-.273,1.991,-.25,.5,2.082,-.25,.997],
// 4 0 1.138 -.25 -.273 1.463 -.25 -.101 1.793 -.25 .161 1.991 -.25 .5
  [4,0,1.138,-.25,-.273,1.463,-.25,-.101,1.793,-.25,.161,1.991,-.25,.5],
// 3 0 .512 -.25 -1.807 -.211 -.25 -1.906 .955 -.25 -2.458
  [3,0,.512,-.25,-1.807,-.211,-.25,-1.906,.955,-.25,-2.458],
// 4 0 -.964 -.25 -1.838 .293 -.25 -3.276 .955 -.25 -2.458 -.211 -.25 -1.906
  [4,0,-.964,-.25,-1.838,.293,-.25,-3.276,.955,-.25,-2.458,-.211,-.25,-1.906],
// 4 0 1.145 -.25 -1.542 .512 -.25 -1.807 .955 -.25 -2.458 1.395 -.25 -1.828
  [4,0,1.145,-.25,-1.542,.512,-.25,-1.807,.955,-.25,-2.458,1.395,-.25,-1.828],
// 3 0 1.695 -.25 -1.089 1.145 -.25 -1.542 1.395 -.25 -1.828
  [3,0,1.695,-.25,-1.089,1.145,-.25,-1.542,1.395,-.25,-1.828],
// 4 0 .293 -.25 -3.276 -.964 -.25 -1.838 -1.566 -.25 -1.7 -.399 -.25 -4.064
  [4,0,.293,-.25,-3.276,-.964,-.25,-1.838,-1.566,-.25,-1.7,-.399,-.25,-4.064],
// 4 4 -12 -.25 6 -12 -.25 7 -16.5 -.25 9 -18 -.25 7.5
  [4,4,-12,-.25,6,-12,-.25,7,-16.5,-.25,9,-18,-.25,7.5],
// 4 4 -12 -.25 6 -18 -.25 7.5 -18 -.25 -7.5 -12 -.25 -6
  [4,4,-12,-.25,6,-18,-.25,7.5,-18,-.25,-7.5,-12,-.25,-6],
// 3 4 -11 -.25 -7 -12 -.25 -7 -16.5 -.25 -9
  [3,4,-11,-.25,-7,-12,-.25,-7,-16.5,-.25,-9],
// 4 4 11 -.25 -7 -11 -.25 -7 -16.5 -.25 -9 16.5 -.25 -9
  [4,4,11,-.25,-7,-11,-.25,-7,-16.5,-.25,-9,16.5,-.25,-9],
// 4 4 18 -.25 7.5 12 -.25 6 12 -.25 -6 18 -.25 -7.5
  [4,4,18,-.25,7.5,12,-.25,6,12,-.25,-6,18,-.25,-7.5],
// 3 4 18 -.25 7.5 12 -.25 7 12 -.25 6
  [3,4,18,-.25,7.5,12,-.25,7,12,-.25,6],
// 3 4 -16.5 -.25 9 -12 -.25 7 -11 -.25 7
  [3,4,-16.5,-.25,9,-12,-.25,7,-11,-.25,7],
// 4 4 -16.5 -.25 9 -11 -.25 7 11 -.25 7 16.5 -.25 9
  [4,4,-16.5,-.25,9,-11,-.25,7,11,-.25,7,16.5,-.25,9],
// 4 4 18 -.25 7.5 16.5 -.25 9 11 -.25 7 12 -.25 7
  [4,4,18,-.25,7.5,16.5,-.25,9,11,-.25,7,12,-.25,7],
// 4 15 11 -.25 -7 0 -.25 -6.5 -11 -.25 -6.5 -11 -.25 -7
  [4,15,11,-.25,-7,0,-.25,-6.5,-11,-.25,-6.5,-11,-.25,-7],
// 3 15 11 -.25 -6.5 0 -.25 -6.5 11 -.25 -7
  [3,15,11,-.25,-6.5,0,-.25,-6.5,11,-.25,-7],
// 4 15 12 -.25 6 11.5 -.25 0 11.5 -.25 -6 12 -.25 -6
  [4,15,12,-.25,6,11.5,-.25,0,11.5,-.25,-6,12,-.25,-6],
// 3 15 12 -.25 6 11.5 -.25 6 11.5 -.25 0
  [3,15,12,-.25,6,11.5,-.25,6,11.5,-.25,0],
// 3 15 -11 -.25 7 -11 -.25 6.5 0 -.25 6.5
  [3,15,-11,-.25,7,-11,-.25,6.5,0,-.25,6.5],
// 4 15 -11 -.25 7 0 -.25 6.5 11 -.25 6.5 11 -.25 7
  [4,15,-11,-.25,7,0,-.25,6.5,11,-.25,6.5,11,-.25,7],
// 4 15 -11.5 -.25 6 -12 -.25 6 -12 -.25 -6 -11.5 -.25 0
  [4,15,-11.5,-.25,6,-12,-.25,6,-12,-.25,-6,-11.5,-.25,0],
// 3 15 -11.5 -.25 0 -12 -.25 -6 -11.5 -.25 -6
  [3,15,-11.5,-.25,0,-12,-.25,-6,-11.5,-.25,-6],
// 4 0 -11 -.25 6.5 -11.5 -.25 6 -3.483 -.25 2.928 -3.155 -.25 3.541
  [4,0,-11,-.25,6.5,-11.5,-.25,6,-3.483,-.25,2.928,-3.155,-.25,3.541],
// 3 0 -11.5 -.25 6 -3.684 -.25 2.264 -3.483 -.25 2.928
  [3,0,-11.5,-.25,6,-3.684,-.25,2.264,-3.483,-.25,2.928],
// 4 0 -11.5 -.25 0 -3.752 -.25 1.573 -3.684 -.25 2.264 -11.5 -.25 6
  [4,0,-11.5,-.25,0,-3.752,-.25,1.573,-3.684,-.25,2.264,-11.5,-.25,6],
// 3 0 -3.752 -.25 1.573 -11.5 -.25 0 -3.684 -.25 .882
  [3,0,-3.752,-.25,1.573,-11.5,-.25,0,-3.684,-.25,.882],
// 4 0 -3.684 -.25 .882 -11.5 -.25 0 -11.5 -.25 -6 -3.483 -.25 .217
  [4,0,-3.684,-.25,.882,-11.5,-.25,0,-11.5,-.25,-6,-3.483,-.25,.217],
// 4 0 -11 -.25 -6.5 -3.155 -.25 -.395 -3.483 -.25 .217 -11.5 -.25 -6
  [4,0,-11,-.25,-6.5,-3.155,-.25,-.395,-3.483,-.25,.217,-11.5,-.25,-6],
// 3 0 -3.155 -.25 -.395 -11 -.25 -6.5 -2.715 -.25 -.932
  [3,0,-3.155,-.25,-.395,-11,-.25,-6.5,-2.715,-.25,-.932],
// 4 0 -2.715 -.25 -.932 -11 -.25 -6.5 -1.281 -.25 -4.914 -2.179 -.25 -1.372
  [4,0,-2.715,-.25,-.932,-11,-.25,-6.5,-1.281,-.25,-4.914,-2.179,-.25,-1.372],
// 4 0 -.399 -.25 -4.064 -1.566 -.25 -1.7 -2.179 -.25 -1.372 -1.281 -.25 -4.914
  [4,0,-.399,-.25,-4.064,-1.566,-.25,-1.7,-2.179,-.25,-1.372,-1.281,-.25,-4.914],
// 3 0 -11 -.25 6.5 -3.155 -.25 3.541 -2.715 -.25 4.077
  [3,0,-11,-.25,6.5,-3.155,-.25,3.541,-2.715,-.25,4.077],
// 3 0 -11 -.25 6.5 -2.715 -.25 4.077 -2.179 -.25 4.517
  [3,0,-11,-.25,6.5,-2.715,-.25,4.077,-2.179,-.25,4.517],
// 4 0 -2.179 -.25 4.517 -1.566 -.25 4.845 0 -.25 6.5 -11 -.25 6.5
  [4,0,-2.179,-.25,4.517,-1.566,-.25,4.845,0,-.25,6.5,-11,-.25,6.5],
// 3 0 0 -.25 6.5 -1.566 -.25 4.845 -.901 -.25 5.046
  [3,0,0,-.25,6.5,-1.566,-.25,4.845,-.901,-.25,5.046],
// 3 0 0 -.25 6.5 -.901 -.25 5.046 -.211 -.25 5.115
  [3,0,0,-.25,6.5,-.901,-.25,5.046,-.211,-.25,5.115],
// 3 0 0 -.25 6.5 -.211 -.25 5.115 .48 -.25 5.046
  [3,0,0,-.25,6.5,-.211,-.25,5.115,.48,-.25,5.046],
// 3 0 0 -.25 6.5 .48 -.25 5.046 1.145 -.25 4.845
  [3,0,0,-.25,6.5,.48,-.25,5.046,1.145,-.25,4.845],
// 4 0 11.5 -.25 6 11 -.25 6.5 1.757 -.25 4.517 2.294 -.25 4.077
  [4,0,11.5,-.25,6,11,-.25,6.5,1.757,-.25,4.517,2.294,-.25,4.077],
// 3 0 11.5 -.25 6 2.294 -.25 4.077 2.734 -.25 3.541
  [3,0,11.5,-.25,6,2.294,-.25,4.077,2.734,-.25,3.541],
// 4 0 1.757 -.25 4.517 11 -.25 6.5 0 -.25 6.5 1.145 -.25 4.845
  [4,0,1.757,-.25,4.517,11,-.25,6.5,0,-.25,6.5,1.145,-.25,4.845],
// 3 0 11.5 -.25 6 2.734 -.25 3.541 3.062 -.25 2.928
  [3,0,11.5,-.25,6,2.734,-.25,3.541,3.062,-.25,2.928],
// 3 0 11.5 -.25 6 3.062 -.25 2.928 3.263 -.25 2.327
  [3,0,11.5,-.25,6,3.062,-.25,2.928,3.263,-.25,2.327],
// 4 0 11.5 -.25 6 3.263 -.25 2.327 3.394 -.25 1.573 11.5 -.25 0
  [4,0,11.5,-.25,6,3.263,-.25,2.327,3.394,-.25,1.573,11.5,-.25,0],
// 3 0 3.394 -.25 1.573 3.411 -.25 .723 11.5 -.25 0
  [3,0,3.394,-.25,1.573,3.411,-.25,.723,11.5,-.25,0],
// 3 0 3.411 -.25 .723 3.348 -.25 .061 11.5 -.25 0
  [3,0,3.411,-.25,.723,3.348,-.25,.061,11.5,-.25,0],
// 4 0 3.096 -.25 -.757 11.5 -.25 -6 11.5 -.25 0 3.348 -.25 .061
  [4,0,3.096,-.25,-.757,11.5,-.25,-6,11.5,-.25,0,3.348,-.25,.061],
// 4 0 11.5 -.25 -6 3.096 -.25 -.757 2.592 -.25 -1.954 11 -.25 -6.5
  [4,0,11.5,-.25,-6,3.096,-.25,-.757,2.592,-.25,-1.954,11,-.25,-6.5],
// 3 0 2.592 -.25 -1.954 2.151 -.25 -2.71 11 -.25 -6.5
  [3,0,2.592,-.25,-1.954,2.151,-.25,-2.71,11,-.25,-6.5],
// 3 0 2.151 -.25 -2.71 1.742 -.25 -3.308 11 -.25 -6.5
  [3,0,2.151,-.25,-2.71,1.742,-.25,-3.308,11,-.25,-6.5],
// 3 0 1.742 -.25 -3.308 1.143 -.25 -4.064 11 -.25 -6.5
  [3,0,1.742,-.25,-3.308,1.143,-.25,-4.064,11,-.25,-6.5],
// 3 0 1.143 -.25 -4.064 .577 -.25 -4.725 11 -.25 -6.5
  [3,0,1.143,-.25,-4.064,.577,-.25,-4.725,11,-.25,-6.5],
// 4 0 0 -.25 -6.5 11 -.25 -6.5 .577 -.25 -4.725 .388 -.25 -4.914
  [4,0,0,-.25,-6.5,11,-.25,-6.5,.577,-.25,-4.725,.388,-.25,-4.914],
// 4 0 -11 -.25 -6.5 0 -.25 -6.5 .388 -.25 -4.914 -1.281 -.25 -4.914
  [4,0,-11,-.25,-6.5,0,-.25,-6.5,.388,-.25,-4.914,-1.281,-.25,-4.914],
];
module ldraw_lib__6196575s(step=0, col=false, unit=2/5, alt=false, line=0.2, solid=!$preview)
    makepoly(ldraw_lib__6196575s(), step=step, col=col, unit=unit, alt=alt, line=line, solid=solid);
ldraw_lib__6196575s(line=0.2);
